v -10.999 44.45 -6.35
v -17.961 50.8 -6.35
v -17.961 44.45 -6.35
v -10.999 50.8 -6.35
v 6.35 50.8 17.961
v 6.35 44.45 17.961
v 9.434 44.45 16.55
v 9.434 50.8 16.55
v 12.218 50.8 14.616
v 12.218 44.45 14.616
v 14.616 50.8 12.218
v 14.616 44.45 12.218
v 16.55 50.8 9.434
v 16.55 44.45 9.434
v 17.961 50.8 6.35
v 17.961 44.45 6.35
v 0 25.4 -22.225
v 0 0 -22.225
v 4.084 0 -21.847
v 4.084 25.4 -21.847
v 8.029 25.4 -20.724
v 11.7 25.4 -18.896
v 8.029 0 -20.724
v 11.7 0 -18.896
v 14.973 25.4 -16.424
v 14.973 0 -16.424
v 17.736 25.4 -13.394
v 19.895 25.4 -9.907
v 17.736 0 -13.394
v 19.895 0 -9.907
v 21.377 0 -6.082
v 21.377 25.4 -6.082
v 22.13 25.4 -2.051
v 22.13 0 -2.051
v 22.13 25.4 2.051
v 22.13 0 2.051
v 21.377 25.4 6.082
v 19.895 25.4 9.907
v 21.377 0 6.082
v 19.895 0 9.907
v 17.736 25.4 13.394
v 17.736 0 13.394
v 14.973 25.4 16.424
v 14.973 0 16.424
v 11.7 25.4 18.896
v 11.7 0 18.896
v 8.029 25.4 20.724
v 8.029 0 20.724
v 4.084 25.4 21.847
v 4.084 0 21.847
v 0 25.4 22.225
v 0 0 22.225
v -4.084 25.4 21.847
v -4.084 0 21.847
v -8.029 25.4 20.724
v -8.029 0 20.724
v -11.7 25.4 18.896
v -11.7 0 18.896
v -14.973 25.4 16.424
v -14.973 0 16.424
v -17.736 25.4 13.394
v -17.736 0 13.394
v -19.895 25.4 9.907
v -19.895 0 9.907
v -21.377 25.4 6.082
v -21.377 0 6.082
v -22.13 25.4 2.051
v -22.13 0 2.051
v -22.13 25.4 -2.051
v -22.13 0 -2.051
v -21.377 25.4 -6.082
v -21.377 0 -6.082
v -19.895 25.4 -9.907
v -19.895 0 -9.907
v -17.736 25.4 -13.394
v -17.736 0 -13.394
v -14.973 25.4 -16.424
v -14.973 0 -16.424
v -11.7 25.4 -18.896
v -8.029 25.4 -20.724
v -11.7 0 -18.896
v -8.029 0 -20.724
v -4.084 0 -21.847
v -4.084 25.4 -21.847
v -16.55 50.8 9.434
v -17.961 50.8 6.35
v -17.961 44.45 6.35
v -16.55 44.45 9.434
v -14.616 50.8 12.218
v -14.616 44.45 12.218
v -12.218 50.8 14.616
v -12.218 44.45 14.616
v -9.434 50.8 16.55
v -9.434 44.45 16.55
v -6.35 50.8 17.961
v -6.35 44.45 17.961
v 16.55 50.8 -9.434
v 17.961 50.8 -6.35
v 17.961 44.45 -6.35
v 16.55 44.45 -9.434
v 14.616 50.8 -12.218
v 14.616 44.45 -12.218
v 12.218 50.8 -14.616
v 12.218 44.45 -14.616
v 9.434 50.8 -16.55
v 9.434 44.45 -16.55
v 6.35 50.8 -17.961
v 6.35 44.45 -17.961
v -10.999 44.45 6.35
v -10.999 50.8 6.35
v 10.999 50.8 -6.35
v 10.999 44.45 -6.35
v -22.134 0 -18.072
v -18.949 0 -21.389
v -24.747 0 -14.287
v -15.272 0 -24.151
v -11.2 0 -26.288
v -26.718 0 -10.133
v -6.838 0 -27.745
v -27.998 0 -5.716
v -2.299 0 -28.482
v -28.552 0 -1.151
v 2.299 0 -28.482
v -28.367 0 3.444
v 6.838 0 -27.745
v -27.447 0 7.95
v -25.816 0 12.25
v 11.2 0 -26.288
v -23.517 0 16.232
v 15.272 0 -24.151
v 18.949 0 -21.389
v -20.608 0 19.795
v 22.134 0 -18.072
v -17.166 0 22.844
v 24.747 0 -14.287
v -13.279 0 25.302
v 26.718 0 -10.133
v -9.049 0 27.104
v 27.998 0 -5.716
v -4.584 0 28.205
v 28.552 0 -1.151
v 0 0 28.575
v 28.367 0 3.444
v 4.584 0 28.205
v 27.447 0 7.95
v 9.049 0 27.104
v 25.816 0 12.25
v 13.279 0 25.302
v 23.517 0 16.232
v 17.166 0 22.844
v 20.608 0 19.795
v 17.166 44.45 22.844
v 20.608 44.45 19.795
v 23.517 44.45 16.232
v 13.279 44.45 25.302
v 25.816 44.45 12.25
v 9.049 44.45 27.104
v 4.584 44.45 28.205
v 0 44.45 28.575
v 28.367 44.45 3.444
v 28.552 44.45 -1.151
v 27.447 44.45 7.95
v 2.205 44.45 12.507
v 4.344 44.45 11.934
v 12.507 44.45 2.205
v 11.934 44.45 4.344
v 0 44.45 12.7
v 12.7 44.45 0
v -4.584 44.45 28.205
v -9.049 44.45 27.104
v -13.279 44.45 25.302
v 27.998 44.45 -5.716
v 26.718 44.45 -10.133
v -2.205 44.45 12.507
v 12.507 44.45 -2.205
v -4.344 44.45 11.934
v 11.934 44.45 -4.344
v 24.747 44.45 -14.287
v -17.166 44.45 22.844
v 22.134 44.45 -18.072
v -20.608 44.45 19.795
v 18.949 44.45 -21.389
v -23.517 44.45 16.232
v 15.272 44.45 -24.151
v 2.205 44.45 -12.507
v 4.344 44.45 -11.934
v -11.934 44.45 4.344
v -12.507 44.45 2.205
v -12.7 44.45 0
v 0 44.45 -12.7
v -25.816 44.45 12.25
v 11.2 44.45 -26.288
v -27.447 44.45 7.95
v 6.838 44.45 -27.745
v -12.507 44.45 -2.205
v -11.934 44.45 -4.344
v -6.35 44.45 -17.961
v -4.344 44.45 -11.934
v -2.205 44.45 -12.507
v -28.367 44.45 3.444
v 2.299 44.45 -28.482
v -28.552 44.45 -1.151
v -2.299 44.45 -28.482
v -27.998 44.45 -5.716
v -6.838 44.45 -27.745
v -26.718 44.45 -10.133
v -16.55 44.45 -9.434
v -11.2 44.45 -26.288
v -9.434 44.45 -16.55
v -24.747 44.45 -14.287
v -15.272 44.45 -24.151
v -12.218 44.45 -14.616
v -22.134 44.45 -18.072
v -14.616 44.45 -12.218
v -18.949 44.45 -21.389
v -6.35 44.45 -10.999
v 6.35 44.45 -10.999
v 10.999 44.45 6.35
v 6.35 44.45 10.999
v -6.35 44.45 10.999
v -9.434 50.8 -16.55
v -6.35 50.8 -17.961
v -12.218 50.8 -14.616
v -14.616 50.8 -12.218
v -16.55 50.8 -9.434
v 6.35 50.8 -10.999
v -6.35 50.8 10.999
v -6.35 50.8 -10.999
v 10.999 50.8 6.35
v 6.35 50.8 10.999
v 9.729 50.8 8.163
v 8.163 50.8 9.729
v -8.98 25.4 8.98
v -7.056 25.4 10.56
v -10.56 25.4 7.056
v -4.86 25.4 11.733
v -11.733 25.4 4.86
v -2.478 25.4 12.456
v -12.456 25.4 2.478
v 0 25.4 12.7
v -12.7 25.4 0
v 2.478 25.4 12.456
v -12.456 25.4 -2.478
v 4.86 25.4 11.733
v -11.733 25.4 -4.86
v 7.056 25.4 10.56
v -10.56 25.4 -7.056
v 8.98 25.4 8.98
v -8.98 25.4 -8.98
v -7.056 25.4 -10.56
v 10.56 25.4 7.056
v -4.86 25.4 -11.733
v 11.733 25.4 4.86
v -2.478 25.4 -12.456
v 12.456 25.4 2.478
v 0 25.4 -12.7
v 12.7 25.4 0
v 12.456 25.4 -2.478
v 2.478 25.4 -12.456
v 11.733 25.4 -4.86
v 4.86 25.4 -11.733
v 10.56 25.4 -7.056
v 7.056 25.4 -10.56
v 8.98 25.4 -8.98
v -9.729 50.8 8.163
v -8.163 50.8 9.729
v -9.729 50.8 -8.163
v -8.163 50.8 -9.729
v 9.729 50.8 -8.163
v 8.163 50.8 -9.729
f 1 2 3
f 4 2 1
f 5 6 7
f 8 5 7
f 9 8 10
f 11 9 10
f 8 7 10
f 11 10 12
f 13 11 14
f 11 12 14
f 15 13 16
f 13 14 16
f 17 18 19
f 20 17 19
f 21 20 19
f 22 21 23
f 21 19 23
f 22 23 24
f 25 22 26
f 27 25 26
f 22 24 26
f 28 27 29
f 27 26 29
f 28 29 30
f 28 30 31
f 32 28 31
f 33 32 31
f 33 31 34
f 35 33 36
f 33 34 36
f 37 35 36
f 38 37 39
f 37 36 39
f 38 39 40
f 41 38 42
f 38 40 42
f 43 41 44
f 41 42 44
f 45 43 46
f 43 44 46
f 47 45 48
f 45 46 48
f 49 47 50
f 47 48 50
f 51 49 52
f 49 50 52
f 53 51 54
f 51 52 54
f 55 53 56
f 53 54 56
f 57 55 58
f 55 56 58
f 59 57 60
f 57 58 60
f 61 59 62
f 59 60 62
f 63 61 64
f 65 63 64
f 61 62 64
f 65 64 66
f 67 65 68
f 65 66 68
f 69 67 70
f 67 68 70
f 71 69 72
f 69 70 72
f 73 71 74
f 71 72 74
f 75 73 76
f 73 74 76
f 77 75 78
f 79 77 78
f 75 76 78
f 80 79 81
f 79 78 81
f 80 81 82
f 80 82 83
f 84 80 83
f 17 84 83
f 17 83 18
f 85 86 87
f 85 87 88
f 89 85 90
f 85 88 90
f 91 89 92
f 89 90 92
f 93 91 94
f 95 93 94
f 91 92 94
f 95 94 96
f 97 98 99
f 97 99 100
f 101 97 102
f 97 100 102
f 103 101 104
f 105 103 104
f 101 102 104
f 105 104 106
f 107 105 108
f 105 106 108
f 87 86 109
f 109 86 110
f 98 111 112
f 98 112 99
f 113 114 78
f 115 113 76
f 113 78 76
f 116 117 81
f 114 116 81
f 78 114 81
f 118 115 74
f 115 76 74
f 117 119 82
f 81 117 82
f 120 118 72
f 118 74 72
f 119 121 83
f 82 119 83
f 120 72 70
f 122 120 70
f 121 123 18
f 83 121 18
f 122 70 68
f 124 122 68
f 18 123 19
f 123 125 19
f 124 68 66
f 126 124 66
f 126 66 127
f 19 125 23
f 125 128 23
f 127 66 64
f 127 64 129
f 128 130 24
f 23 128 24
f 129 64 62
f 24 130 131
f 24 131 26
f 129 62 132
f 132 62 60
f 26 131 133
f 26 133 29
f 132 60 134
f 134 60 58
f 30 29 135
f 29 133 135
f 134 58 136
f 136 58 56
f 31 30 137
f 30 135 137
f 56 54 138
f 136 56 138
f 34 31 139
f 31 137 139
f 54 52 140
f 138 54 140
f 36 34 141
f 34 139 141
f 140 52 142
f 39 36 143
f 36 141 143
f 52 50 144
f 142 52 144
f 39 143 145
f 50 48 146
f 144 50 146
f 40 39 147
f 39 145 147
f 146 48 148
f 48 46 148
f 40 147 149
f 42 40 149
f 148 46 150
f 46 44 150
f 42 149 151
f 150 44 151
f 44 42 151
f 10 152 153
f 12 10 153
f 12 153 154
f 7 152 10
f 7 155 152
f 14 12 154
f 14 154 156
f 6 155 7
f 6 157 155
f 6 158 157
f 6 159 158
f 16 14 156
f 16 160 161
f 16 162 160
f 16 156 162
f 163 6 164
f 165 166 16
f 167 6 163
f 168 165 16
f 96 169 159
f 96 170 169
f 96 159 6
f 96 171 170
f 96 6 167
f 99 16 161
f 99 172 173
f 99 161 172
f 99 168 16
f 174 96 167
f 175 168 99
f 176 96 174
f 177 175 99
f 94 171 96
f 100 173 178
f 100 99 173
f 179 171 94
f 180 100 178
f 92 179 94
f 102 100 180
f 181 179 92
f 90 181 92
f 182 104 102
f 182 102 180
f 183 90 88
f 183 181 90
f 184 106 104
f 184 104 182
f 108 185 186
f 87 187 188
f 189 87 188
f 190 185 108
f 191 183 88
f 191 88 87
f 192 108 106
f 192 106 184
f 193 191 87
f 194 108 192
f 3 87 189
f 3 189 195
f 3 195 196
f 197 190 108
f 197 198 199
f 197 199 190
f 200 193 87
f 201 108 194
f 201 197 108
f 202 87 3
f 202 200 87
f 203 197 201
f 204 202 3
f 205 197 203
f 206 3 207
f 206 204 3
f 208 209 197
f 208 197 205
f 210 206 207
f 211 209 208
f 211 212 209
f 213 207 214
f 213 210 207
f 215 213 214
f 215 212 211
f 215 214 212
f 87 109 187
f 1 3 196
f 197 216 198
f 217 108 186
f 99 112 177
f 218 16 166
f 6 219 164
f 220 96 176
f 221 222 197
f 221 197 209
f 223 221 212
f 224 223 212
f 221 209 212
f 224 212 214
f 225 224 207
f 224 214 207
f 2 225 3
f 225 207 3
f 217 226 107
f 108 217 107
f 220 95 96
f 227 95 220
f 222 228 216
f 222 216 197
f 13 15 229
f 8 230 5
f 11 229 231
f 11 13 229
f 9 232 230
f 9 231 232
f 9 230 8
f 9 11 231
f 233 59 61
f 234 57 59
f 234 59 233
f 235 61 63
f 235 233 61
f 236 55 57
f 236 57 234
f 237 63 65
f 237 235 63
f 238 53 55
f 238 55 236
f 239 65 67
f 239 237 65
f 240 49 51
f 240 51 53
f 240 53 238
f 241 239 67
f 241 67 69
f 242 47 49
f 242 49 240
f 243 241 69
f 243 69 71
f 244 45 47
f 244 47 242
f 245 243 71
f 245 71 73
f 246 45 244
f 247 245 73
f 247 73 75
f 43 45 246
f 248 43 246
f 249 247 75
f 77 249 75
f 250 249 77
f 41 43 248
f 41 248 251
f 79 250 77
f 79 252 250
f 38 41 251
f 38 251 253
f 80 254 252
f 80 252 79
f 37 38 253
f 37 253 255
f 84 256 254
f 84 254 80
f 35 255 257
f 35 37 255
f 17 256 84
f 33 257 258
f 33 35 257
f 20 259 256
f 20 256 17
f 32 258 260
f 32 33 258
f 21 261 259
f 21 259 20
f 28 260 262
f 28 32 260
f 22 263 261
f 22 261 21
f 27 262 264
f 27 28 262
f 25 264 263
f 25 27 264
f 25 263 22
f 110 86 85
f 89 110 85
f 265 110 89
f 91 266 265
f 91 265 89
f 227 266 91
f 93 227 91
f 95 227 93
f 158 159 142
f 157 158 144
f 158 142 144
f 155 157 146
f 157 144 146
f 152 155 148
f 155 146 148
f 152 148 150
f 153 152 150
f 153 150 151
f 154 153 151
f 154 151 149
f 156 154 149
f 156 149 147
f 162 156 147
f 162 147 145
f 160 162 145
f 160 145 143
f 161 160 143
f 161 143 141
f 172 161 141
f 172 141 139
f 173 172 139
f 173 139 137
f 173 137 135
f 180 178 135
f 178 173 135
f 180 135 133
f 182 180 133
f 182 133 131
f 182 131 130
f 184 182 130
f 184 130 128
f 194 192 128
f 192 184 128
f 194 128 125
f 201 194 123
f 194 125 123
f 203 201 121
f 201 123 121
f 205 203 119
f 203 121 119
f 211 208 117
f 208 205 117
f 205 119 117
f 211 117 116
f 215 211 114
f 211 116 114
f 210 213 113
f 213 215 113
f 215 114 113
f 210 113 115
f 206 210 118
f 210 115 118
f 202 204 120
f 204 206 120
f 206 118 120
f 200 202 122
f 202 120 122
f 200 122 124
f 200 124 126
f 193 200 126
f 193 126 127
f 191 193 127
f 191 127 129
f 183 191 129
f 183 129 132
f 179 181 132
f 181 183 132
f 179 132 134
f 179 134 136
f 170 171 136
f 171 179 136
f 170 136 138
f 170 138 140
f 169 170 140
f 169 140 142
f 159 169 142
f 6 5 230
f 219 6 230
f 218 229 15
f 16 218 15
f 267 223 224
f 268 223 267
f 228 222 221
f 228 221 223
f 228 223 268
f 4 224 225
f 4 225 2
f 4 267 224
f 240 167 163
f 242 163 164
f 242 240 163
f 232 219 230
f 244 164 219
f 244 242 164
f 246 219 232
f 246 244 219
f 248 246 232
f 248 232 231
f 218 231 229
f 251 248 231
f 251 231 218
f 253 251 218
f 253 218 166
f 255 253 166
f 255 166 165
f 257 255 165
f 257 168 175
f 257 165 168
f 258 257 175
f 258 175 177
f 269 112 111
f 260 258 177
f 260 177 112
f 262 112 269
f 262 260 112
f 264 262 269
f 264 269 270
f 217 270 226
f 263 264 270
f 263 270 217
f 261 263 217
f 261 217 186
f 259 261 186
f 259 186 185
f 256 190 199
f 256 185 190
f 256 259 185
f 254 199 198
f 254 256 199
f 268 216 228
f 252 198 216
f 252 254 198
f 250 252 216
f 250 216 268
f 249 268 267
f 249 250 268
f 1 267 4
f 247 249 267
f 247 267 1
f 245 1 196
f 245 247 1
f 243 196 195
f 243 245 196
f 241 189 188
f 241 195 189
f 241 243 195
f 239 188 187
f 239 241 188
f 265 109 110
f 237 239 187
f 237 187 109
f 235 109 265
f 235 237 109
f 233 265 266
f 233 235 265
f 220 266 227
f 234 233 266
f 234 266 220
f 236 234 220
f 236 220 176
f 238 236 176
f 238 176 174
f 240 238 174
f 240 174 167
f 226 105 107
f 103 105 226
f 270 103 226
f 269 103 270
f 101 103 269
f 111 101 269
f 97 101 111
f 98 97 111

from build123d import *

# Parameters (mm, degrees)
SKETCH2_R           = 28.575
SKETCH2_R_2         = 12.7
BOSS_EXTRUDE2_DEPTH = 50.8
SKETCH4_W           = 76.2
SKETCH4_H           = 12.7
CUT_EXTRUDE7_DEPTH  = 6.35
CIRPATTERN1_COUNT   = 2
CIRPATTERN1_ANGLE   = 90
SKETCH9_R           = 22.225
CUT_EXTRUDE8_DEPTH  = 25.4
CUT_EXTRUDE10_START = -6.35
SKETCH10_R          = 28.575
SKETCH10_R_2        = 19.05
CUT_EXTRUDE10_DEPTH = 6.35


with BuildPart() as part:
    # Sketch2 → Boss-Extrude2 (new body)
    with BuildSketch(Plane(origin=(0, 0, 0), x_dir=(1, 0, 0), z_dir=(0, 1, 0))):
        with Locations(Location((0, 0, 0), (0, 0, 270))):
            Circle(SKETCH2_R)
        with Locations(Location((0, 0, 0), (0, 0, 270))):
            Circle(SKETCH2_R_2, mode=Mode.SUBTRACT)
    extrude(amount=BOSS_EXTRUDE2_DEPTH)

    # Sketch4 → Cut-Extrude7 (cut)
    with BuildSketch(Plane(origin=(0, 50.8, 0), x_dir=(1, 0, 0), z_dir=(0, 1, 0))):
        Rectangle(SKETCH4_W, SKETCH4_H)
    cut_extrude7 = extrude(amount=-CUT_EXTRUDE7_DEPTH, mode=Mode.SUBTRACT)

    # CirPattern1: Cut-Extrude7 ×2 about axis
    cirpattern1_axis = Axis((0, 50.8, 0), (0, 1, 0))
    for i in range(1, CIRPATTERN1_COUNT):
        add(cut_extrude7.rotate(cirpattern1_axis, i * CIRPATTERN1_ANGLE / (CIRPATTERN1_COUNT - 1)), mode=Mode.SUBTRACT)

    # Sketch9 → Cut-Extrude8 (cut)
    with BuildSketch(Plane.XZ):
        with Locations(Location((0, 0, 0), (0, 0, 270))):
            Circle(SKETCH9_R)
    extrude(amount=-CUT_EXTRUDE8_DEPTH, mode=Mode.SUBTRACT)

    # Sketch10 → Cut-Extrude10 (cut)
    with BuildSketch(Plane(origin=(0, 50.8, 0), x_dir=(1, 0, 0), z_dir=(0, 1, 0)).offset(CUT_EXTRUDE10_START)):
        with Locations(Location((0, 0, 0), (0, 0, 90))):
            Circle(SKETCH10_R)
        Circle(SKETCH10_R_2, mode=Mode.SUBTRACT)
    extrude(amount=CUT_EXTRUDE10_DEPTH, mode=Mode.SUBTRACT)


solid = part.part
